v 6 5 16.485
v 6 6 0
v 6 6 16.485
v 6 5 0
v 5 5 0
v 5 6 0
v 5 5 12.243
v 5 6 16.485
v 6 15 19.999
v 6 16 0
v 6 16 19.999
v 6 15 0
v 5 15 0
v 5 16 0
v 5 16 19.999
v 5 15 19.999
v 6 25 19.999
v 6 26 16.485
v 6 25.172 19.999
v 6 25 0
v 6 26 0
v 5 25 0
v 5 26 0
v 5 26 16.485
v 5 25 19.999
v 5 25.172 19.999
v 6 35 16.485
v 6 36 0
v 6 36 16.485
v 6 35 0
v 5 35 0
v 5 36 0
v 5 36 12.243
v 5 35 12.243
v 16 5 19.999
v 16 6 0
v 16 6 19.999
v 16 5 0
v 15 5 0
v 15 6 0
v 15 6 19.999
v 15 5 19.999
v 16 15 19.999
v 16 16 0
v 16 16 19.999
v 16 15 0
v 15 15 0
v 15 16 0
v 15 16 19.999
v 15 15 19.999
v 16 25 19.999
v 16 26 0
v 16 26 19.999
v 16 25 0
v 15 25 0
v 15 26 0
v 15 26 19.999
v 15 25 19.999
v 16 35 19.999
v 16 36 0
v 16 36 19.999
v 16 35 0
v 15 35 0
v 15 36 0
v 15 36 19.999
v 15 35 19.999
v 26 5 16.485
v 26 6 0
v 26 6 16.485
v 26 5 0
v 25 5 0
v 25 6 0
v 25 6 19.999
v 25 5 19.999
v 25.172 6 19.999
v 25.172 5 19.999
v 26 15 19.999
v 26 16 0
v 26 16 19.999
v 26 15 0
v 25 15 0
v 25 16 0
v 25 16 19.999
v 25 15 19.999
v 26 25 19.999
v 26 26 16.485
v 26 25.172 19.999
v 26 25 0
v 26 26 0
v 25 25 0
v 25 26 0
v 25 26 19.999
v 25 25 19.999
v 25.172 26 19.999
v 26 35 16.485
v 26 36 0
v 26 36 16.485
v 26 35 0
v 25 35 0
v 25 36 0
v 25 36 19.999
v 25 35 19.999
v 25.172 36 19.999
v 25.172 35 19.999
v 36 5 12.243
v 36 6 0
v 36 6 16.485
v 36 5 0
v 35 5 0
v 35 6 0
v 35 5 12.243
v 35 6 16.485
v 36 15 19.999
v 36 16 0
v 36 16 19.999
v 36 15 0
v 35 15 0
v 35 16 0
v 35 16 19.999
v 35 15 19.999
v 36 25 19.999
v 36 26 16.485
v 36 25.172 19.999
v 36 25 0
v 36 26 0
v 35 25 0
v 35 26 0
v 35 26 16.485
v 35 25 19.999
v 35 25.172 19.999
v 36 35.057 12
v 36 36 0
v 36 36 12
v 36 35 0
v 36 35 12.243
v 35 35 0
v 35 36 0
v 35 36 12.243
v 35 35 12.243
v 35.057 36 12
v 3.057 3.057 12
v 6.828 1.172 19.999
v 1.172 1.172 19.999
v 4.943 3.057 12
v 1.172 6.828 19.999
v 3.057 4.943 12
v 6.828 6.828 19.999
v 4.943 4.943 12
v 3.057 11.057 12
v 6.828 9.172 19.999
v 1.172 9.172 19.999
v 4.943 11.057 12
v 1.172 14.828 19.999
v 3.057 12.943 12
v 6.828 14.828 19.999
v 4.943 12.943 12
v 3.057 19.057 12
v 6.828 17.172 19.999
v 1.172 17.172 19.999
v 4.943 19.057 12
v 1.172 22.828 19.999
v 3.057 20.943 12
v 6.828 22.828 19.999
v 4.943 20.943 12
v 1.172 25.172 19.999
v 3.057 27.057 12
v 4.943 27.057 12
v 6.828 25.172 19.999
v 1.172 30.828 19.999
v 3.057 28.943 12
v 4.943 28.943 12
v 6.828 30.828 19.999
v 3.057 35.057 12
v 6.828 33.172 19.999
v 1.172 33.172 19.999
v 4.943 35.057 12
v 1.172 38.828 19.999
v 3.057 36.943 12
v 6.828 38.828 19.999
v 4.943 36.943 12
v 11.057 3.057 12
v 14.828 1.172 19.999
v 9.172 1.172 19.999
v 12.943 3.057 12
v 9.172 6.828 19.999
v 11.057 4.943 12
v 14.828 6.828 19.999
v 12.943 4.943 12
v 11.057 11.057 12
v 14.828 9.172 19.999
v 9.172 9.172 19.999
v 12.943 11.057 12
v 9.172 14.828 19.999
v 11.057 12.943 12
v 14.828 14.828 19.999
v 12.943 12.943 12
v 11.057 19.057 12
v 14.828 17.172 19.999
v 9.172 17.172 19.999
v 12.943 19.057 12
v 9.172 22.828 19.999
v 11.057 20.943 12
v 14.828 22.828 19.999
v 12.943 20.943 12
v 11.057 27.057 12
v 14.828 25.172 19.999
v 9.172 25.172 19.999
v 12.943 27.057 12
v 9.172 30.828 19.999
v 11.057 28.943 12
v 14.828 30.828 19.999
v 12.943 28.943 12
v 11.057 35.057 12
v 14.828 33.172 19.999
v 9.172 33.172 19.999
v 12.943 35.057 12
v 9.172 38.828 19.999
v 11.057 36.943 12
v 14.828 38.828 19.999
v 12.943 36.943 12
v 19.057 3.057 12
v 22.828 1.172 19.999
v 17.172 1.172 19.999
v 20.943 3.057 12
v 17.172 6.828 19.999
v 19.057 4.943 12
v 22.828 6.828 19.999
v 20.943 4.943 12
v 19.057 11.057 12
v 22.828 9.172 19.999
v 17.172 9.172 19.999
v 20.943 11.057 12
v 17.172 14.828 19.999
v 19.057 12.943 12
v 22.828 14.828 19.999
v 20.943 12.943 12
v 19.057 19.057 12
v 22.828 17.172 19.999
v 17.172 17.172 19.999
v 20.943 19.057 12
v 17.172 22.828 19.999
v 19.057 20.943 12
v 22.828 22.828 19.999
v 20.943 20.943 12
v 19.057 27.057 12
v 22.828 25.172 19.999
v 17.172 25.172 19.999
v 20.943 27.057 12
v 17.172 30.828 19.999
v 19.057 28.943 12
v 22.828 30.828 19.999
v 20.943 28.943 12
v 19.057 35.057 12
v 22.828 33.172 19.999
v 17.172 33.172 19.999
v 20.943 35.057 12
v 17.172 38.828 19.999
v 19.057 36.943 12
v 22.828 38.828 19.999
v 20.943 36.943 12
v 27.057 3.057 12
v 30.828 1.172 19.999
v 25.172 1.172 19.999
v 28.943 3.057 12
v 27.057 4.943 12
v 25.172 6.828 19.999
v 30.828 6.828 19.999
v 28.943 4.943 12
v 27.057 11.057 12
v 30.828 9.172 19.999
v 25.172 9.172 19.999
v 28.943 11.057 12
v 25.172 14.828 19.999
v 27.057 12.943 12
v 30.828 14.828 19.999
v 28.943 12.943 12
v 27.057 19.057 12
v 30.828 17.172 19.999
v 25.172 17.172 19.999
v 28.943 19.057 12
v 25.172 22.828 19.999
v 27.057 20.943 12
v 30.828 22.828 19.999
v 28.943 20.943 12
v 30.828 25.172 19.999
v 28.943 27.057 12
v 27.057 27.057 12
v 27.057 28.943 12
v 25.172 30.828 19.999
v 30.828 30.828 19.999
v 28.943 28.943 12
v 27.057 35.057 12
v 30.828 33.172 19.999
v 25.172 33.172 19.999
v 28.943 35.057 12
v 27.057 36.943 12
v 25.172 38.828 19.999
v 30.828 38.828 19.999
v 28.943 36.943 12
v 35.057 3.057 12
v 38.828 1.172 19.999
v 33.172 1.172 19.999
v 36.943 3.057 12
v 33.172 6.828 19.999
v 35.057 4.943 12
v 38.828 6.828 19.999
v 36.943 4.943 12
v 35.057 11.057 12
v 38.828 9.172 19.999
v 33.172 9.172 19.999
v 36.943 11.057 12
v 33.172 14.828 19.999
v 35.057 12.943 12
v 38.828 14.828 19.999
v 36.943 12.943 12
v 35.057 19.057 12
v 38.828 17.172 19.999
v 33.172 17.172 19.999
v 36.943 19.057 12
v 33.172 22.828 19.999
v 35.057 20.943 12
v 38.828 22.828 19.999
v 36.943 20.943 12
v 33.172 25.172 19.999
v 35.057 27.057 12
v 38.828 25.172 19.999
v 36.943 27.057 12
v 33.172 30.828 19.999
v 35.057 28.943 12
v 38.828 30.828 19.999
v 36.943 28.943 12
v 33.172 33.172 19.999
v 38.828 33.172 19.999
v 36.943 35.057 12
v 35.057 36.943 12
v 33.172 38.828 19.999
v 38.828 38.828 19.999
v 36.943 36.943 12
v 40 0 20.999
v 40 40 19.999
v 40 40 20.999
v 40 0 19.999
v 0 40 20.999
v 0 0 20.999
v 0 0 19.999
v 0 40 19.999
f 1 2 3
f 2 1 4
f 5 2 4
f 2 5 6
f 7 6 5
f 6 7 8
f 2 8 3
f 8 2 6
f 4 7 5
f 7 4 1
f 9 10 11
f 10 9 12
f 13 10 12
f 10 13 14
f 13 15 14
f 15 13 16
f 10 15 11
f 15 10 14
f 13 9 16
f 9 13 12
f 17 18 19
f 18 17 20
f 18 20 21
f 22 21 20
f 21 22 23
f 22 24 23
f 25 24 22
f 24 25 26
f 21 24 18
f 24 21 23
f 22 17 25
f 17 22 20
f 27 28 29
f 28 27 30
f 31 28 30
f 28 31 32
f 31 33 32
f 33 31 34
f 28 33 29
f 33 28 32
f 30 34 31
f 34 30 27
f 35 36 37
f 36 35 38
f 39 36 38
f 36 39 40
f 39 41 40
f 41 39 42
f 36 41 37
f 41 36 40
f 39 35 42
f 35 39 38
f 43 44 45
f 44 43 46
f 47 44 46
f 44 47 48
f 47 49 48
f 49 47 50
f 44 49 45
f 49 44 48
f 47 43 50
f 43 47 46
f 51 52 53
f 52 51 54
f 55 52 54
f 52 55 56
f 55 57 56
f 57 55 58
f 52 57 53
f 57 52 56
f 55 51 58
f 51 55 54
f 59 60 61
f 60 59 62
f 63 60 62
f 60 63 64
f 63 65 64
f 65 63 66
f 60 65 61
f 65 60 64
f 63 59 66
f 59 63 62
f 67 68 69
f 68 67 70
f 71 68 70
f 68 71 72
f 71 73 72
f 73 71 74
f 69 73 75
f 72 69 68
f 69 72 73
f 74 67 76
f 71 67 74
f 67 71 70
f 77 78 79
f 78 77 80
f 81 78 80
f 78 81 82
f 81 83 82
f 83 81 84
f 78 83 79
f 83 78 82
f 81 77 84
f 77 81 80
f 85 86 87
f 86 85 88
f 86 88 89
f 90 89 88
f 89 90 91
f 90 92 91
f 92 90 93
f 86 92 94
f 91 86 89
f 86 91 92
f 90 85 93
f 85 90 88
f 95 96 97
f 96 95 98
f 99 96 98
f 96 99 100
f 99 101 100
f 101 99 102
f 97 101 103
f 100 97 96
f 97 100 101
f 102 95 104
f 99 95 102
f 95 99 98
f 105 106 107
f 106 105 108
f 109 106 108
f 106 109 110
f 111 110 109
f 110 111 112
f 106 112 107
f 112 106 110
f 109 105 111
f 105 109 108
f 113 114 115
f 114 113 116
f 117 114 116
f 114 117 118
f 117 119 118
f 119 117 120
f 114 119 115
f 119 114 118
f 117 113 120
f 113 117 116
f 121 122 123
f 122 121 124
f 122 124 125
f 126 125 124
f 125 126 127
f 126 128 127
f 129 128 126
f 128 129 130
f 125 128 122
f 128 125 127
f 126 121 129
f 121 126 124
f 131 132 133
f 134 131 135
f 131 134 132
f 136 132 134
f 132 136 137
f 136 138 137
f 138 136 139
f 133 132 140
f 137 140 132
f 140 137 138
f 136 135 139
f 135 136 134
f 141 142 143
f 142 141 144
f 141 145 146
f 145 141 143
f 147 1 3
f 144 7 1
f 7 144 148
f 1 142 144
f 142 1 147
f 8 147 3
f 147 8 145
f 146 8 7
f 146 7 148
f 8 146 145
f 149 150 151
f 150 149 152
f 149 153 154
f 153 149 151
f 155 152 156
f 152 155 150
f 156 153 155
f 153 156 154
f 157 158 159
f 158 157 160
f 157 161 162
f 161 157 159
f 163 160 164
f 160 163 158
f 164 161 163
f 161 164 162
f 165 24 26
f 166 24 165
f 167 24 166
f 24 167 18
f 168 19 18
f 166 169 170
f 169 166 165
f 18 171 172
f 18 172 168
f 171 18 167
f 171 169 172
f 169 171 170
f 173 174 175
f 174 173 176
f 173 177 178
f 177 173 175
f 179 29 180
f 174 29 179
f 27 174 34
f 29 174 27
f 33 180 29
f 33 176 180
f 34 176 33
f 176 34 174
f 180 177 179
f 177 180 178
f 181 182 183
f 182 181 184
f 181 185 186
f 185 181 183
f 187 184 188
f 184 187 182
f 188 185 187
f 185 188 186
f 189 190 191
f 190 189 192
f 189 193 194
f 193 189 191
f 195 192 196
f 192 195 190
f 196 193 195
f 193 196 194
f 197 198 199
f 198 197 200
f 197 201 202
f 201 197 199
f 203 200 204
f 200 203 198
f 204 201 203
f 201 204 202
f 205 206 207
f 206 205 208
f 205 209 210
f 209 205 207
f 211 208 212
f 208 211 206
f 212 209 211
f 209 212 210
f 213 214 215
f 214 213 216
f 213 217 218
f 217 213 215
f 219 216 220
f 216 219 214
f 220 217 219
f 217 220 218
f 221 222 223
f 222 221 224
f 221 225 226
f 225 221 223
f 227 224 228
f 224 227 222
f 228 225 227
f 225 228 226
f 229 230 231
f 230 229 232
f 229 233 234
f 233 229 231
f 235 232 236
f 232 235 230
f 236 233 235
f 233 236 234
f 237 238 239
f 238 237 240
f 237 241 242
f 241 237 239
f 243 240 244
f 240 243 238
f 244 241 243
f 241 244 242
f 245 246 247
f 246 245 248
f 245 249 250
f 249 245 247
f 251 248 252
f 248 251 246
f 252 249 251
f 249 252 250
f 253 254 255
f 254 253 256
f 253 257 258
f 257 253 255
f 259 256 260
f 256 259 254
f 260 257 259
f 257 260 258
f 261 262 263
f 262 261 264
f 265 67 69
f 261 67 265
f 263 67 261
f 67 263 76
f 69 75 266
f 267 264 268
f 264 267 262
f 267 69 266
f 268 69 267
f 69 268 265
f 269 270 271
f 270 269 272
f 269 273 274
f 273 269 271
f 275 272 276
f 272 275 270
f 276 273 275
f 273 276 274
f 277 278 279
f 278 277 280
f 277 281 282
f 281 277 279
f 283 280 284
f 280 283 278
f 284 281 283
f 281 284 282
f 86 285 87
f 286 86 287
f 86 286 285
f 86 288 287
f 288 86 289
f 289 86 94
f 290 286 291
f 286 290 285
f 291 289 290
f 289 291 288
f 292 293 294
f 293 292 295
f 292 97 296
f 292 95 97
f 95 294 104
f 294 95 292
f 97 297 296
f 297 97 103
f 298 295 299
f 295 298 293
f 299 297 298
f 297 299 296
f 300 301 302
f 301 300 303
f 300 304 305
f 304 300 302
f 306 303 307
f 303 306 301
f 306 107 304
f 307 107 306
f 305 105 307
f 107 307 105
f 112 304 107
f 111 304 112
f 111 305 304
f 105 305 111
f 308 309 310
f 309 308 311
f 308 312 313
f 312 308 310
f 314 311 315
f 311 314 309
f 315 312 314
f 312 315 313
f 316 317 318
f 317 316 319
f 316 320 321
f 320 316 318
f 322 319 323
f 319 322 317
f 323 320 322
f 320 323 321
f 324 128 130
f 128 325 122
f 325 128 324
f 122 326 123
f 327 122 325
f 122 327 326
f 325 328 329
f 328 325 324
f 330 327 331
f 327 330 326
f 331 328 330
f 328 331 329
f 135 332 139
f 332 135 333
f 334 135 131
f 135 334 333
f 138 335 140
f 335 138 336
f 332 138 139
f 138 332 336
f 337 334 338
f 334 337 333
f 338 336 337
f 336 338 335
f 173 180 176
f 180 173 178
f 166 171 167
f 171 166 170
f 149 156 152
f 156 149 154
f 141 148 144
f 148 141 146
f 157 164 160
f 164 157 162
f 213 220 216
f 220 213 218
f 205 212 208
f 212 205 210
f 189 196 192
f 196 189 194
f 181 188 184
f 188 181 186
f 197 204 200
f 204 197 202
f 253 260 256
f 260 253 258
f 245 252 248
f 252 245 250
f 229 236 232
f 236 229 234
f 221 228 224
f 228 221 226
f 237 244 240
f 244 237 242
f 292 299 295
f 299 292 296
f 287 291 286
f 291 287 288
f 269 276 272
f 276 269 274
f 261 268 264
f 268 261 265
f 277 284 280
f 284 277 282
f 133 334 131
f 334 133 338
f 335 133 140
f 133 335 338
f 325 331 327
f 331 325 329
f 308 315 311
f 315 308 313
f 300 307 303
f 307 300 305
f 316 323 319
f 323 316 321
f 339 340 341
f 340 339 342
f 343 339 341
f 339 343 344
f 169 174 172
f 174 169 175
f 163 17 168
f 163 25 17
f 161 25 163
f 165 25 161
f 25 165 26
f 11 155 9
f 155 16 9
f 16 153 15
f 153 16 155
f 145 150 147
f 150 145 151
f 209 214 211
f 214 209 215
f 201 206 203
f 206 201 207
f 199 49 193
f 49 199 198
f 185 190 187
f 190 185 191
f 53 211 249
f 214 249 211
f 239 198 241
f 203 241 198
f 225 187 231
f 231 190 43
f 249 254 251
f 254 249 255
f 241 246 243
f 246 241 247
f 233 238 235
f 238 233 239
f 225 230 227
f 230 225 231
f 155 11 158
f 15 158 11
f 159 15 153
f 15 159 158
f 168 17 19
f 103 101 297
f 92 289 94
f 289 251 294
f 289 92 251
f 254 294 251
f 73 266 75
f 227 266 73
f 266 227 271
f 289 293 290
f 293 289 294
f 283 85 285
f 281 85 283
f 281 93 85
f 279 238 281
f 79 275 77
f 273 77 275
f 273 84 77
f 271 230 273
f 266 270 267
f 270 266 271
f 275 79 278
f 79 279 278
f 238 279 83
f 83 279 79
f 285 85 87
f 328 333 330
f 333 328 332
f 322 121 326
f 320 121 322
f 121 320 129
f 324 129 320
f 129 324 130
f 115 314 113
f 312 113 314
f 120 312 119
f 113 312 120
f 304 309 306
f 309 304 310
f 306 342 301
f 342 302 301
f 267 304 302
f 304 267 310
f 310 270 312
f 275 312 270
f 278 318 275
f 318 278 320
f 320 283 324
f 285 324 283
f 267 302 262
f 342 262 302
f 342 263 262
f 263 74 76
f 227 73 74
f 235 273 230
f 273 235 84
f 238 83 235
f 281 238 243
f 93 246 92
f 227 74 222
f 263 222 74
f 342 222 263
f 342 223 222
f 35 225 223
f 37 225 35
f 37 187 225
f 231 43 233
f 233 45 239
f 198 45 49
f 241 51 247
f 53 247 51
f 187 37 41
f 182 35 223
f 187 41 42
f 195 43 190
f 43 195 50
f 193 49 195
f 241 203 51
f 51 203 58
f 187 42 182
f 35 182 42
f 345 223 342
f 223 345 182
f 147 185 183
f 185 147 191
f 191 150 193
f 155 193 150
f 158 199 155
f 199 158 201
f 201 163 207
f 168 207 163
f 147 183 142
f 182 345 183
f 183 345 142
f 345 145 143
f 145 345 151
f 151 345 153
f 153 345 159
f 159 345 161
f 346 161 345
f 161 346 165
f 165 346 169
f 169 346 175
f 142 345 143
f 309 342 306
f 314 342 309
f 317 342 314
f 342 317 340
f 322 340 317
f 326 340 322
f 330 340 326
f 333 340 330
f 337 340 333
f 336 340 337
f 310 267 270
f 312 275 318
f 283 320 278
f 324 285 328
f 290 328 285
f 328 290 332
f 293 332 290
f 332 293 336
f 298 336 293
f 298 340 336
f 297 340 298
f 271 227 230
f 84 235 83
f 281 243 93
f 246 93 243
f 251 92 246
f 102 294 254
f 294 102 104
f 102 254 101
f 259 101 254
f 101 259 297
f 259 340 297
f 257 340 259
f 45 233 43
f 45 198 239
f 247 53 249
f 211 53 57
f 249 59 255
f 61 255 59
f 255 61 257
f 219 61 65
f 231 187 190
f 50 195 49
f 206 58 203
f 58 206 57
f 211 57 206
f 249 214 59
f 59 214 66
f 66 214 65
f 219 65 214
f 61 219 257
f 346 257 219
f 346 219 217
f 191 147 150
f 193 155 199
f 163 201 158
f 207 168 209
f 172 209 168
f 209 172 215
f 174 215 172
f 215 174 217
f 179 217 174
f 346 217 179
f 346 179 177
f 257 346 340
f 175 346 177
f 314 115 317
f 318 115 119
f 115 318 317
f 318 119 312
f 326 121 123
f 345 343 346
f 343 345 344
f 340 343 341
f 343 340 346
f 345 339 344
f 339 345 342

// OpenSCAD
module wavyRoof(width,height,amplitude,wavelength,poleCount) {
    union() {
        for(x = [0 : poleCount - 1]) {
            for(y = [0 : poleCount - 1]) {
                translate([x * width / poleCount + width / poleCount / 2,y * width / poleCount + width / poleCount / 2,0]) {
                    cube([width / poleCount / 10,width / poleCount / 10,height]);
                }
            }
        }
        difference() {
            translate([0,0,height]) {
                for(x = [0 : wavelength : width - wavelength]) {
                    for(y = [0 : wavelength : width - wavelength]) {
                        translate([wavelength / 2 + x,wavelength / 2 + y,0]) {
                            rotate([180,0,0]) {
                                pyramid(wavelength,amplitude * 1.5);
                            }
                        }
                    }
                }
            }
            cube([width,width,height - amplitude]);
        }
        translate([0,0,height - 0.001]) {
            cube([width,width,1]);
        }
    }
}

module pyramid(width,height) {
    rotate([0,0,45]) {
        cylinder(h = height,r1 = width / 2,r2 = 0,$fn=4);
    }
}

wavyRoof(width = 40,height = 20,amplitude = 8,wavelength = 8,poleCount = 4);
